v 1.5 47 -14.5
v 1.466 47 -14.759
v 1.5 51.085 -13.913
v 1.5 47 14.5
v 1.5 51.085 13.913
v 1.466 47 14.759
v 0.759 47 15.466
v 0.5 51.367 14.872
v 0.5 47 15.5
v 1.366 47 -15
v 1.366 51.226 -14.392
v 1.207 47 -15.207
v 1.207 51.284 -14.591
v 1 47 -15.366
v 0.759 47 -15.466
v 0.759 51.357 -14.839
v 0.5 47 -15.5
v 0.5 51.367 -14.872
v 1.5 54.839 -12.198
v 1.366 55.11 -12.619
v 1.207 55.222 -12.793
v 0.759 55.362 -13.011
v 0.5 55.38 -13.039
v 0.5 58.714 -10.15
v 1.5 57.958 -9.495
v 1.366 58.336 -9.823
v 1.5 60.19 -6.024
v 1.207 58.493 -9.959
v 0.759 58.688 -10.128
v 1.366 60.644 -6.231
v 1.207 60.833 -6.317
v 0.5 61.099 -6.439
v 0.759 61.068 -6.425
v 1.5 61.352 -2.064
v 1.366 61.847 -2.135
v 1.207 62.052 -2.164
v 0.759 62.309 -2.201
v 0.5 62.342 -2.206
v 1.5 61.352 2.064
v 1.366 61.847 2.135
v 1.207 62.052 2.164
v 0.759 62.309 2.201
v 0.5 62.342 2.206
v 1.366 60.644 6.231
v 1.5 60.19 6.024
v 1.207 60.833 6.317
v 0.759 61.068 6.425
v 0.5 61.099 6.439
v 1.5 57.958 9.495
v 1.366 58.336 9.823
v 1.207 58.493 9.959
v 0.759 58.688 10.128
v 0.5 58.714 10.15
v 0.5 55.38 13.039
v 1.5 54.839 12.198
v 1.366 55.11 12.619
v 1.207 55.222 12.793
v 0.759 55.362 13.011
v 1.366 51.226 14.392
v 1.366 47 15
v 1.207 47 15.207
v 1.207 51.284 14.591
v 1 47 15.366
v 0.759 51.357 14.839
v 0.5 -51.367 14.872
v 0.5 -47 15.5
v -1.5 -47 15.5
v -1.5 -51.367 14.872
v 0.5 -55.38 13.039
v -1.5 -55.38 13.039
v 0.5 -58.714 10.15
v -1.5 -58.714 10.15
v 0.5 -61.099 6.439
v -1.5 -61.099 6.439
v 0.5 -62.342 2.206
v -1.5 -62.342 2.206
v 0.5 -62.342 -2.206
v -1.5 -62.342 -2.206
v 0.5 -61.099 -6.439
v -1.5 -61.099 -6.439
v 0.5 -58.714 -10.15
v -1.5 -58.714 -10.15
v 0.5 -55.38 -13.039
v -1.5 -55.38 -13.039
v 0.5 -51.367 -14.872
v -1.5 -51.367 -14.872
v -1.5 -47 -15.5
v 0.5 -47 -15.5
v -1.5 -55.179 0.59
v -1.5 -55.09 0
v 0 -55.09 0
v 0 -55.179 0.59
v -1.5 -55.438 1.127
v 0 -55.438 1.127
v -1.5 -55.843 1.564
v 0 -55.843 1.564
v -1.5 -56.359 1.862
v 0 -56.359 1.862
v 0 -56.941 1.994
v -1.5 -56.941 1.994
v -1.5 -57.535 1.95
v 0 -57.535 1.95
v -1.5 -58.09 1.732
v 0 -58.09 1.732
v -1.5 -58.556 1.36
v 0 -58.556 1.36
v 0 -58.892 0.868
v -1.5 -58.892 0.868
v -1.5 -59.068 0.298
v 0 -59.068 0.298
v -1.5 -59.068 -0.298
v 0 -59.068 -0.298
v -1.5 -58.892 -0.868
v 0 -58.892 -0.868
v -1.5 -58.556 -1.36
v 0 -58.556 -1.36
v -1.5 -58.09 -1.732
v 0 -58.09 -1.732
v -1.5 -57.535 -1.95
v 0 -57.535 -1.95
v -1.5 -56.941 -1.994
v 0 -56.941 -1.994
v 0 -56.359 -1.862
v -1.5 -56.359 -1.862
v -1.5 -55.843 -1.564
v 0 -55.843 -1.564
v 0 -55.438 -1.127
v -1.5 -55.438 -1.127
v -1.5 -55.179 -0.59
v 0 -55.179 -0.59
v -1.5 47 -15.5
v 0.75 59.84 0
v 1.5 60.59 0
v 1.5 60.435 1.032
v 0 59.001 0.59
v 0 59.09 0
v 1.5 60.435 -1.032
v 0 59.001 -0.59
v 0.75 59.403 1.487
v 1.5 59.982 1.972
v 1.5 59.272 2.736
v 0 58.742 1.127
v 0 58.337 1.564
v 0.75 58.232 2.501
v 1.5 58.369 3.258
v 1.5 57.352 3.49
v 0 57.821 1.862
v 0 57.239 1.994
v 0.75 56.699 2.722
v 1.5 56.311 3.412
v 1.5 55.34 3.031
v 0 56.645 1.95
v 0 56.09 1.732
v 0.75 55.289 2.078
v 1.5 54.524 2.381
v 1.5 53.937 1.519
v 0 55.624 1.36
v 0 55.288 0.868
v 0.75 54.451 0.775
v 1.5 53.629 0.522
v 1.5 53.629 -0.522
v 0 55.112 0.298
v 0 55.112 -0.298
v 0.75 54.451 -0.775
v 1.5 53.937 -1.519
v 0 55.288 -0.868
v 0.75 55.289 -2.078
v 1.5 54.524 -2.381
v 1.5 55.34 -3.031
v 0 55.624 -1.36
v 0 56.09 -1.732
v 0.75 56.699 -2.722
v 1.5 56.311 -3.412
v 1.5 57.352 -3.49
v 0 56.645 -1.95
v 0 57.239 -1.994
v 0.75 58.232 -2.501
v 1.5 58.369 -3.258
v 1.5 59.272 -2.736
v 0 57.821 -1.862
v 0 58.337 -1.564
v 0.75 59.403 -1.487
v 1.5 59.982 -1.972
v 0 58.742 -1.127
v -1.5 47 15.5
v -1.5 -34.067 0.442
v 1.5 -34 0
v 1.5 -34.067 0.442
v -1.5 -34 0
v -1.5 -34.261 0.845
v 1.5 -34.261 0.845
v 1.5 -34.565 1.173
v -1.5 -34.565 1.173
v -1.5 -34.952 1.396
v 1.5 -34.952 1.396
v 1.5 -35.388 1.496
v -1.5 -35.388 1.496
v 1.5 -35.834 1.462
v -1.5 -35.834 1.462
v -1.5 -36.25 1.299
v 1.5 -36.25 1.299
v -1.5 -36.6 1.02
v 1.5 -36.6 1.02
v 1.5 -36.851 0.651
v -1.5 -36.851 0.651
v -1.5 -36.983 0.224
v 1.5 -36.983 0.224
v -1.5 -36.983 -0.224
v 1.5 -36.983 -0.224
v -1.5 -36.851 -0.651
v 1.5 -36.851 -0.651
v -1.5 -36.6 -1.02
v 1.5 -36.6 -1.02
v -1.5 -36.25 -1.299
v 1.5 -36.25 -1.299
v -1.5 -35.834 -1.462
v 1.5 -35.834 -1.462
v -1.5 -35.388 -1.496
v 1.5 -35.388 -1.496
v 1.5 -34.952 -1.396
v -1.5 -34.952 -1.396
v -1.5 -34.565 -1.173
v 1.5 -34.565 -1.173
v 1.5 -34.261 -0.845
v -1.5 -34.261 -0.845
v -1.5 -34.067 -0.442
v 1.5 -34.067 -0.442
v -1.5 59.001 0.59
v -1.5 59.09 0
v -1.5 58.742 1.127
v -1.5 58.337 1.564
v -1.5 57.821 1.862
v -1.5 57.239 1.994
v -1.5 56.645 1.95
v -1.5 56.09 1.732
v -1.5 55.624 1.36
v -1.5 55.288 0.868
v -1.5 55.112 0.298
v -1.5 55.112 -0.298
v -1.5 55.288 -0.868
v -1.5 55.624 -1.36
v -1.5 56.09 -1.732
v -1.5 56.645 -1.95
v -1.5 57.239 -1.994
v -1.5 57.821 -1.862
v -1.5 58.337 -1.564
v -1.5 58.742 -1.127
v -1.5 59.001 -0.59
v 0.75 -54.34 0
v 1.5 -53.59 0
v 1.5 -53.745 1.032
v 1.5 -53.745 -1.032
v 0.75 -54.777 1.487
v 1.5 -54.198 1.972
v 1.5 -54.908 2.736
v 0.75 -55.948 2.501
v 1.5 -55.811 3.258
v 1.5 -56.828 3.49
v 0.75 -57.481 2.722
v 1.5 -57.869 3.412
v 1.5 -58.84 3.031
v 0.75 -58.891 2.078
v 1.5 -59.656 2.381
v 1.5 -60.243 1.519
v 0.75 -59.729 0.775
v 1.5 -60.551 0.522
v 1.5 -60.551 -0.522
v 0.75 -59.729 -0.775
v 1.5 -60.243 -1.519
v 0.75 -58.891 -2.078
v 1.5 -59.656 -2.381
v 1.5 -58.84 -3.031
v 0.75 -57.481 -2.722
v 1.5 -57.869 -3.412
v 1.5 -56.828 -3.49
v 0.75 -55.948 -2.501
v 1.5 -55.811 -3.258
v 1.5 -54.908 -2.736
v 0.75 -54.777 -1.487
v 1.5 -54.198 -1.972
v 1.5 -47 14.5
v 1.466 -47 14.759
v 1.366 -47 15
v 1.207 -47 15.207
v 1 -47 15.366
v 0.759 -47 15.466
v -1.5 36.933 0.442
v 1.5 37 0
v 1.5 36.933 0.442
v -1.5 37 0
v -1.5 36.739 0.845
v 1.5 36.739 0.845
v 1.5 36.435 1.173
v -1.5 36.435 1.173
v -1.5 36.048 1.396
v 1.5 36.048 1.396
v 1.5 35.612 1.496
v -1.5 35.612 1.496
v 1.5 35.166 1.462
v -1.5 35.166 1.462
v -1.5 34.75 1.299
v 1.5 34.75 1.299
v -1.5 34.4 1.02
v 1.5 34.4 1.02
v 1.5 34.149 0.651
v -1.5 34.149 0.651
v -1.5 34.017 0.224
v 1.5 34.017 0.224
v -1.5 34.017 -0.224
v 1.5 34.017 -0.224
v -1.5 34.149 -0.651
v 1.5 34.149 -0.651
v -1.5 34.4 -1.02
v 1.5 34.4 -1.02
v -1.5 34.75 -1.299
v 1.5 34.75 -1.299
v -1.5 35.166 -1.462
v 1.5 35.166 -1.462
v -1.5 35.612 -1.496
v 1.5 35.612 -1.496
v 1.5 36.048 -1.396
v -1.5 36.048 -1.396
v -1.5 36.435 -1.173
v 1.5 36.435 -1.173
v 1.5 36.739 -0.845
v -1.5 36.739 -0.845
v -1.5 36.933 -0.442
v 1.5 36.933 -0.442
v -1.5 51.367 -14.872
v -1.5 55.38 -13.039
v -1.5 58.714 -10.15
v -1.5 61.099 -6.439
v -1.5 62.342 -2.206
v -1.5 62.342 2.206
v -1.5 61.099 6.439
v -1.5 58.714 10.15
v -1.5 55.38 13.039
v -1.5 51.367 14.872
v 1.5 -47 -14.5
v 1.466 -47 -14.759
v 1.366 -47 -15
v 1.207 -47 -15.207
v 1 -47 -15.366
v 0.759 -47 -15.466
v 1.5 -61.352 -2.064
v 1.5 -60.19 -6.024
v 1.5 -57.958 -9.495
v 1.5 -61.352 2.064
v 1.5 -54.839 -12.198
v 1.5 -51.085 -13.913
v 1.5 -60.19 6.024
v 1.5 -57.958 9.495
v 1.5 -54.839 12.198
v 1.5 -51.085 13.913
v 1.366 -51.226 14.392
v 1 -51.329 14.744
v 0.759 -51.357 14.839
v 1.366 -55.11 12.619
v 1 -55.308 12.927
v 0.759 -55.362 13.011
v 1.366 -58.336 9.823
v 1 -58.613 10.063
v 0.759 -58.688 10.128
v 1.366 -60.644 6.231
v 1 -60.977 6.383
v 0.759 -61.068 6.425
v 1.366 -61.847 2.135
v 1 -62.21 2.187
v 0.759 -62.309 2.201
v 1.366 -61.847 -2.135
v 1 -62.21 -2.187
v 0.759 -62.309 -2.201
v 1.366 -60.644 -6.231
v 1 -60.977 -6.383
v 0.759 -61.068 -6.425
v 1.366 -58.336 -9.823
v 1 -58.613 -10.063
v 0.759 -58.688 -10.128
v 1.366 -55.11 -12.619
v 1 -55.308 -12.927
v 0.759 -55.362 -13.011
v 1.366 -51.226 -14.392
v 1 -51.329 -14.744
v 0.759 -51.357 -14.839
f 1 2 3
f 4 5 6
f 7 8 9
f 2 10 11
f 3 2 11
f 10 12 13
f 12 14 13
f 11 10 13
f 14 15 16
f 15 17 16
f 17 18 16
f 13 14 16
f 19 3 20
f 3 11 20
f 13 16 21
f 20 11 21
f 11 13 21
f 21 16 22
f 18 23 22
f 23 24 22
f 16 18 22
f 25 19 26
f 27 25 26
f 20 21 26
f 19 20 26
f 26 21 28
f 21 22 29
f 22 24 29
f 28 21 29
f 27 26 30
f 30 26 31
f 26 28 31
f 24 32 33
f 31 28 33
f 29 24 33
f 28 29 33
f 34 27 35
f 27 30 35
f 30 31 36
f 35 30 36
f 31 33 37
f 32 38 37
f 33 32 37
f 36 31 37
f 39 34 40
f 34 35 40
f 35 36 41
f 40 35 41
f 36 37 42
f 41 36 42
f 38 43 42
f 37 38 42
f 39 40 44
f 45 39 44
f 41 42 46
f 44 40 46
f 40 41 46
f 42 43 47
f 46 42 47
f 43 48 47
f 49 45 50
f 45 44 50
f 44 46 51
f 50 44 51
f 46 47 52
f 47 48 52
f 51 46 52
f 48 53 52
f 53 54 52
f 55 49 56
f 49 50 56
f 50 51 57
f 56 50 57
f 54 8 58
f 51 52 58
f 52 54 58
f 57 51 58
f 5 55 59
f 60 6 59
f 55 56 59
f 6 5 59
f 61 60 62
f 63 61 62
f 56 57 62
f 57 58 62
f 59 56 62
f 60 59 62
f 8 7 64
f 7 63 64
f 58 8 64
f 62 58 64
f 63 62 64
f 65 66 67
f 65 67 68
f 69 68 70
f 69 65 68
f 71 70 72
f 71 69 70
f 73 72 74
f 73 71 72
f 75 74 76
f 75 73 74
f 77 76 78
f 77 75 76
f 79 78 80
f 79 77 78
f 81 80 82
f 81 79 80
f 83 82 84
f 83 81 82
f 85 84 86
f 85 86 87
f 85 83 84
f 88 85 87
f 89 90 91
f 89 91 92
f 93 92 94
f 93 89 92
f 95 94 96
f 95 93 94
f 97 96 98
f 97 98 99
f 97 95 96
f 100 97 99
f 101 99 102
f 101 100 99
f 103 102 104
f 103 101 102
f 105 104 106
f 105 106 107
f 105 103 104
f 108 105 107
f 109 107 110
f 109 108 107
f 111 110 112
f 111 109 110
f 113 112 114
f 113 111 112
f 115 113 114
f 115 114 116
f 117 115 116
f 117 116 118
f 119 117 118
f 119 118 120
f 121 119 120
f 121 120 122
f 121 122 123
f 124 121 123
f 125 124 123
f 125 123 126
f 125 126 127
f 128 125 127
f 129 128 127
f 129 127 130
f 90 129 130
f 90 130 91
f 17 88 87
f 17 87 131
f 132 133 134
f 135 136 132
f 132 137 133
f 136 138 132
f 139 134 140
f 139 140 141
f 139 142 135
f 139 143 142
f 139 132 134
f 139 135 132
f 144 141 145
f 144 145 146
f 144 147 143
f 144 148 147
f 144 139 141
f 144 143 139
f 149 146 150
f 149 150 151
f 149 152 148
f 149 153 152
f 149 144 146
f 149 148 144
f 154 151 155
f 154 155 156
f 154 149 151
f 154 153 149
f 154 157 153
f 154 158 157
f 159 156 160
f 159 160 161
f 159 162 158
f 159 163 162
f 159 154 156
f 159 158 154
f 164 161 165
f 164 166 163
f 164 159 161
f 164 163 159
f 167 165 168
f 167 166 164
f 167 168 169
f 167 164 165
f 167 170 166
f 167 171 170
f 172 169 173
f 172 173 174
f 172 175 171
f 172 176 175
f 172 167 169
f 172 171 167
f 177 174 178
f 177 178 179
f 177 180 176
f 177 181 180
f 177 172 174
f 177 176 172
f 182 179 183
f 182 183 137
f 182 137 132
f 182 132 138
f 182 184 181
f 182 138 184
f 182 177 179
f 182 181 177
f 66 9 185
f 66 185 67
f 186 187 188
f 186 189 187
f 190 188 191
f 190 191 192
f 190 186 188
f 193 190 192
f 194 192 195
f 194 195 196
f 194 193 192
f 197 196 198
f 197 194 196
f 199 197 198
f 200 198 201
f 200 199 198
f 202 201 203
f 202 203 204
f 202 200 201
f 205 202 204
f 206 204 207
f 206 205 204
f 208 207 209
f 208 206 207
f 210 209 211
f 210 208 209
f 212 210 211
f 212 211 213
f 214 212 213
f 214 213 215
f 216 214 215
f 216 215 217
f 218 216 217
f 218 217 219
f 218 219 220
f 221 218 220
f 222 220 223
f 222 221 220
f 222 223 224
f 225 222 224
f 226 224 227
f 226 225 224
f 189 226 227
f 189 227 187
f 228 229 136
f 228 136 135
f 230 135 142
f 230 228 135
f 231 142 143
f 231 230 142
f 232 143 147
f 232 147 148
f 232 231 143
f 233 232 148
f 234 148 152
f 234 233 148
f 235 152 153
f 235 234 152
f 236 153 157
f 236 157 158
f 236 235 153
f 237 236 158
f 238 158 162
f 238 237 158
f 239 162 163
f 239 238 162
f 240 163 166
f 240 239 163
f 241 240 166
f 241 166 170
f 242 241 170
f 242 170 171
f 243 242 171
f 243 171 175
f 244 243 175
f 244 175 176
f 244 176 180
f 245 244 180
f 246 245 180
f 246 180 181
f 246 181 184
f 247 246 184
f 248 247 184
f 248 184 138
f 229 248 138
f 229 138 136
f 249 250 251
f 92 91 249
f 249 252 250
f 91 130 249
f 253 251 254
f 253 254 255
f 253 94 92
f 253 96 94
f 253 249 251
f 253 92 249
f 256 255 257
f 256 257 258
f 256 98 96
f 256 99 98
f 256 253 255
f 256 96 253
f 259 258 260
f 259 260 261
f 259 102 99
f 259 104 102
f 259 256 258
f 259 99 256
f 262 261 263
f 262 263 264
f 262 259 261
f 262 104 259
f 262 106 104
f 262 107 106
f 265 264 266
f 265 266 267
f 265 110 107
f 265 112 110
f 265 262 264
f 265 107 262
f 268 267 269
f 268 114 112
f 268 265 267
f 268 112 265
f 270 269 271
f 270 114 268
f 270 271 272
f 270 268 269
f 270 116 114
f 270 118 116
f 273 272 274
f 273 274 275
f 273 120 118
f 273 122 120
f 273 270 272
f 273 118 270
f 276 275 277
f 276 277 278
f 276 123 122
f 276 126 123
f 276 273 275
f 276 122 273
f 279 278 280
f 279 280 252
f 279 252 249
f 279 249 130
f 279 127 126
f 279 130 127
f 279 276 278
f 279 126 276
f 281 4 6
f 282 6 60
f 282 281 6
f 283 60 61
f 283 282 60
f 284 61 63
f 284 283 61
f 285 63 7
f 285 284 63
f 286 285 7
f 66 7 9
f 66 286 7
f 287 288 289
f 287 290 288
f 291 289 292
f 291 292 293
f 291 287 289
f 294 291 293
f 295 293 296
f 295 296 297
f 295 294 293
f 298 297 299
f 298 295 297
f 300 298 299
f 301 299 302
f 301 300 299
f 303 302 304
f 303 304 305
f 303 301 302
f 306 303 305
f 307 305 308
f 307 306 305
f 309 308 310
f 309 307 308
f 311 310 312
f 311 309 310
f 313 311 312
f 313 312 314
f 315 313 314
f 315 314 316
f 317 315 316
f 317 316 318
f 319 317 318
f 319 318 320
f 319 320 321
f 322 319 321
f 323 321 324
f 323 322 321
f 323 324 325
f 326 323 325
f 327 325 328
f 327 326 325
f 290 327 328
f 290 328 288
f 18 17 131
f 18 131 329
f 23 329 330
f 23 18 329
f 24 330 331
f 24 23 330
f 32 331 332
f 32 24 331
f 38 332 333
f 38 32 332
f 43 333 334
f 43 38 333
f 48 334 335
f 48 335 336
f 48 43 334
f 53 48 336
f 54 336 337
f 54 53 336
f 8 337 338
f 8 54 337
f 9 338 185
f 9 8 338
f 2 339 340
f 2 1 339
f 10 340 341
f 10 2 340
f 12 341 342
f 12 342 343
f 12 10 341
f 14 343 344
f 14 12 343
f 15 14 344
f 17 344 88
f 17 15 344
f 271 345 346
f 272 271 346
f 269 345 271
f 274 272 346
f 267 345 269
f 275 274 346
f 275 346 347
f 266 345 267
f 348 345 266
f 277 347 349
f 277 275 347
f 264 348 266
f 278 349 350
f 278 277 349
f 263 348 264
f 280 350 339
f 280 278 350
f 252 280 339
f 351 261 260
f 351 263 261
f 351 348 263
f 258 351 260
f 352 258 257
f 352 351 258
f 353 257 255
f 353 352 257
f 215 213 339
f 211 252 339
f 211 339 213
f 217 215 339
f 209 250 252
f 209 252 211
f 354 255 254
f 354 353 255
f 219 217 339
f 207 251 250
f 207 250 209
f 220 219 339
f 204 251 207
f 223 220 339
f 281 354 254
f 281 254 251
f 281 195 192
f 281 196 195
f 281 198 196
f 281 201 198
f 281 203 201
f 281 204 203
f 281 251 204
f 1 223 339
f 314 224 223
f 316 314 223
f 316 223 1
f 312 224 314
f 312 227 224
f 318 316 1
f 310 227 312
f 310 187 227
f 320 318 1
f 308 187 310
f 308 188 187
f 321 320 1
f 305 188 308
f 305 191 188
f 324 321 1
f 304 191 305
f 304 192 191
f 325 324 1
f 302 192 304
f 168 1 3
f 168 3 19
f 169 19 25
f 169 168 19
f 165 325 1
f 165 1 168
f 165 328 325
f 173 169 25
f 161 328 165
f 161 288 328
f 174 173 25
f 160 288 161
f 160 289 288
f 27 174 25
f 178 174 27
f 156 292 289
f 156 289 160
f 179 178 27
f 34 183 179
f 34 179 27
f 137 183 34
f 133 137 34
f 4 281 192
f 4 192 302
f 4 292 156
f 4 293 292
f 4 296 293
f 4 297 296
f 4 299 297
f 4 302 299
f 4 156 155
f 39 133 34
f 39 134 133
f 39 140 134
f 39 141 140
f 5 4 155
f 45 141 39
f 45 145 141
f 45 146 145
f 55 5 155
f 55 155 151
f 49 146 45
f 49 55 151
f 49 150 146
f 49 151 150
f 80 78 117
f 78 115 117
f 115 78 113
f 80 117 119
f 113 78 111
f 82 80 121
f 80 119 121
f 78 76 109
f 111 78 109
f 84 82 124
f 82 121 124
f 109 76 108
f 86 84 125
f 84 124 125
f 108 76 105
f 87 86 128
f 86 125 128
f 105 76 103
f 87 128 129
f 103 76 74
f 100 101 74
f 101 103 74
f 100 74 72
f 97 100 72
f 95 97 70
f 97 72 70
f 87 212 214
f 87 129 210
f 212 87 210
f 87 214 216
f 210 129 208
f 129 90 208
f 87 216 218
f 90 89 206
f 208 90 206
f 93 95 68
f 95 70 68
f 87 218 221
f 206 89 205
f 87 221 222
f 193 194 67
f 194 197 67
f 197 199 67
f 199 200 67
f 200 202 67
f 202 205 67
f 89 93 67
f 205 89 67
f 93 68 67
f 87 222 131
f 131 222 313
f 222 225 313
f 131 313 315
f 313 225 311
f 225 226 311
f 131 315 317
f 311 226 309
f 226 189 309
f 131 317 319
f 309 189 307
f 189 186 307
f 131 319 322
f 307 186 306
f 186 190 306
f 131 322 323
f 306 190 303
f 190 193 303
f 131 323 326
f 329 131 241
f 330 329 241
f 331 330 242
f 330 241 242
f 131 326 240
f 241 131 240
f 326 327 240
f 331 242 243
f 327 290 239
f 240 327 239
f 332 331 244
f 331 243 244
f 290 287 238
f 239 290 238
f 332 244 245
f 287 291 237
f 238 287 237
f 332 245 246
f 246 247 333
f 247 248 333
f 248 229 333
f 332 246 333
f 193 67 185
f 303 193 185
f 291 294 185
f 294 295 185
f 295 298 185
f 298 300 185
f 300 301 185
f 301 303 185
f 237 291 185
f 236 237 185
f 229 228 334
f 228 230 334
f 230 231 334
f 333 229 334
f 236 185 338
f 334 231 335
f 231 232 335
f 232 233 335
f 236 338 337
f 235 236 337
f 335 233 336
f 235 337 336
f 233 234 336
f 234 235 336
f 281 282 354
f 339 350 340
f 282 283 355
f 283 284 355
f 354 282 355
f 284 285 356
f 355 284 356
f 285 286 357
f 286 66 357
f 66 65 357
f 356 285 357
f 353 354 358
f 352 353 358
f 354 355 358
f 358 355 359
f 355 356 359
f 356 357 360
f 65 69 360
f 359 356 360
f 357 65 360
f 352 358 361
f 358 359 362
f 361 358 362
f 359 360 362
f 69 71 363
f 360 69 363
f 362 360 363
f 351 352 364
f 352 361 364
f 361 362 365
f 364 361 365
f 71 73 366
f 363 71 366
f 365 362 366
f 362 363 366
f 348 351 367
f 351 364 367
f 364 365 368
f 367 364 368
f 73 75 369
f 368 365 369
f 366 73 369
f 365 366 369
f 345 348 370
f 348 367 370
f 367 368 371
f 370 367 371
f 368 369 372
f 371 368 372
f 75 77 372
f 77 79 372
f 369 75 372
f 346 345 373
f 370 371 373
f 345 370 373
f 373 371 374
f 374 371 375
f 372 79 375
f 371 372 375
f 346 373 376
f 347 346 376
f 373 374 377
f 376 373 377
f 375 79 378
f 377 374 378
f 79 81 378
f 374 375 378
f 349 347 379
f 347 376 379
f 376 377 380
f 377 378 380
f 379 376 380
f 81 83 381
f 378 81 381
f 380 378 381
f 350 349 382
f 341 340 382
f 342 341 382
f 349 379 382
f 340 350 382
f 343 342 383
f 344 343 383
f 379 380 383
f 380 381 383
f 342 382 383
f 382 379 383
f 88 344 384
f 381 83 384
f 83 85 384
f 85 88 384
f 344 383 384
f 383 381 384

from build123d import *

# Parameters (mm, degrees)
F0_R     = 2
F0_R_2   = 1.5
F1_DEPTH = 1.5
F2_SIZE  = 1.5
F3_R     = 1


with BuildPart() as f1:
    # F0 (on Right) → F1 (new body, symmetric)
    with BuildSketch(Plane.YZ):
        with BuildLine():
            Line((47, 15.5), (0, 15.5))
            Line((0, 15.5), (-47, 15.5))
            ThreePointArc((-47, 15.5), (-62.5, 0), (-47, -15.5))
            Line((-47, -15.5), (0, -15.5))
            Line((0, -15.5), (47, -15.5))
            ThreePointArc((47, -15.5), (62.5, 0), (47, 15.5))
        make_face()
        with Locations((-57.09, 0)):
            Circle(F0_R, mode=Mode.SUBTRACT)
        with Locations((-35.5, 0)):
            Circle(F0_R_2, mode=Mode.SUBTRACT)
        with Locations((35.5, 0)):
            Circle(F0_R_2, mode=Mode.SUBTRACT)
        with Locations((57.09, 0)):
            Circle(F0_R, mode=Mode.SUBTRACT)
    extrude(amount=F1_DEPTH, both=True)

    # F2
    f2_edges = [f1.edges().sort_by_distance(p)[0] for p in [
        (1.5, -59.09, 0),
        (1.5, 55.09, 0),
    ]]
    chamfer(f2_edges, length=F2_SIZE)

    # F3
    f3_edges = [f1.edges().sort_by_distance(p)[0] for p in [
        (1.5, 0, -15.5),
    ]]
    fillet(f3_edges, radius=F3_R)


solid = f1.part
